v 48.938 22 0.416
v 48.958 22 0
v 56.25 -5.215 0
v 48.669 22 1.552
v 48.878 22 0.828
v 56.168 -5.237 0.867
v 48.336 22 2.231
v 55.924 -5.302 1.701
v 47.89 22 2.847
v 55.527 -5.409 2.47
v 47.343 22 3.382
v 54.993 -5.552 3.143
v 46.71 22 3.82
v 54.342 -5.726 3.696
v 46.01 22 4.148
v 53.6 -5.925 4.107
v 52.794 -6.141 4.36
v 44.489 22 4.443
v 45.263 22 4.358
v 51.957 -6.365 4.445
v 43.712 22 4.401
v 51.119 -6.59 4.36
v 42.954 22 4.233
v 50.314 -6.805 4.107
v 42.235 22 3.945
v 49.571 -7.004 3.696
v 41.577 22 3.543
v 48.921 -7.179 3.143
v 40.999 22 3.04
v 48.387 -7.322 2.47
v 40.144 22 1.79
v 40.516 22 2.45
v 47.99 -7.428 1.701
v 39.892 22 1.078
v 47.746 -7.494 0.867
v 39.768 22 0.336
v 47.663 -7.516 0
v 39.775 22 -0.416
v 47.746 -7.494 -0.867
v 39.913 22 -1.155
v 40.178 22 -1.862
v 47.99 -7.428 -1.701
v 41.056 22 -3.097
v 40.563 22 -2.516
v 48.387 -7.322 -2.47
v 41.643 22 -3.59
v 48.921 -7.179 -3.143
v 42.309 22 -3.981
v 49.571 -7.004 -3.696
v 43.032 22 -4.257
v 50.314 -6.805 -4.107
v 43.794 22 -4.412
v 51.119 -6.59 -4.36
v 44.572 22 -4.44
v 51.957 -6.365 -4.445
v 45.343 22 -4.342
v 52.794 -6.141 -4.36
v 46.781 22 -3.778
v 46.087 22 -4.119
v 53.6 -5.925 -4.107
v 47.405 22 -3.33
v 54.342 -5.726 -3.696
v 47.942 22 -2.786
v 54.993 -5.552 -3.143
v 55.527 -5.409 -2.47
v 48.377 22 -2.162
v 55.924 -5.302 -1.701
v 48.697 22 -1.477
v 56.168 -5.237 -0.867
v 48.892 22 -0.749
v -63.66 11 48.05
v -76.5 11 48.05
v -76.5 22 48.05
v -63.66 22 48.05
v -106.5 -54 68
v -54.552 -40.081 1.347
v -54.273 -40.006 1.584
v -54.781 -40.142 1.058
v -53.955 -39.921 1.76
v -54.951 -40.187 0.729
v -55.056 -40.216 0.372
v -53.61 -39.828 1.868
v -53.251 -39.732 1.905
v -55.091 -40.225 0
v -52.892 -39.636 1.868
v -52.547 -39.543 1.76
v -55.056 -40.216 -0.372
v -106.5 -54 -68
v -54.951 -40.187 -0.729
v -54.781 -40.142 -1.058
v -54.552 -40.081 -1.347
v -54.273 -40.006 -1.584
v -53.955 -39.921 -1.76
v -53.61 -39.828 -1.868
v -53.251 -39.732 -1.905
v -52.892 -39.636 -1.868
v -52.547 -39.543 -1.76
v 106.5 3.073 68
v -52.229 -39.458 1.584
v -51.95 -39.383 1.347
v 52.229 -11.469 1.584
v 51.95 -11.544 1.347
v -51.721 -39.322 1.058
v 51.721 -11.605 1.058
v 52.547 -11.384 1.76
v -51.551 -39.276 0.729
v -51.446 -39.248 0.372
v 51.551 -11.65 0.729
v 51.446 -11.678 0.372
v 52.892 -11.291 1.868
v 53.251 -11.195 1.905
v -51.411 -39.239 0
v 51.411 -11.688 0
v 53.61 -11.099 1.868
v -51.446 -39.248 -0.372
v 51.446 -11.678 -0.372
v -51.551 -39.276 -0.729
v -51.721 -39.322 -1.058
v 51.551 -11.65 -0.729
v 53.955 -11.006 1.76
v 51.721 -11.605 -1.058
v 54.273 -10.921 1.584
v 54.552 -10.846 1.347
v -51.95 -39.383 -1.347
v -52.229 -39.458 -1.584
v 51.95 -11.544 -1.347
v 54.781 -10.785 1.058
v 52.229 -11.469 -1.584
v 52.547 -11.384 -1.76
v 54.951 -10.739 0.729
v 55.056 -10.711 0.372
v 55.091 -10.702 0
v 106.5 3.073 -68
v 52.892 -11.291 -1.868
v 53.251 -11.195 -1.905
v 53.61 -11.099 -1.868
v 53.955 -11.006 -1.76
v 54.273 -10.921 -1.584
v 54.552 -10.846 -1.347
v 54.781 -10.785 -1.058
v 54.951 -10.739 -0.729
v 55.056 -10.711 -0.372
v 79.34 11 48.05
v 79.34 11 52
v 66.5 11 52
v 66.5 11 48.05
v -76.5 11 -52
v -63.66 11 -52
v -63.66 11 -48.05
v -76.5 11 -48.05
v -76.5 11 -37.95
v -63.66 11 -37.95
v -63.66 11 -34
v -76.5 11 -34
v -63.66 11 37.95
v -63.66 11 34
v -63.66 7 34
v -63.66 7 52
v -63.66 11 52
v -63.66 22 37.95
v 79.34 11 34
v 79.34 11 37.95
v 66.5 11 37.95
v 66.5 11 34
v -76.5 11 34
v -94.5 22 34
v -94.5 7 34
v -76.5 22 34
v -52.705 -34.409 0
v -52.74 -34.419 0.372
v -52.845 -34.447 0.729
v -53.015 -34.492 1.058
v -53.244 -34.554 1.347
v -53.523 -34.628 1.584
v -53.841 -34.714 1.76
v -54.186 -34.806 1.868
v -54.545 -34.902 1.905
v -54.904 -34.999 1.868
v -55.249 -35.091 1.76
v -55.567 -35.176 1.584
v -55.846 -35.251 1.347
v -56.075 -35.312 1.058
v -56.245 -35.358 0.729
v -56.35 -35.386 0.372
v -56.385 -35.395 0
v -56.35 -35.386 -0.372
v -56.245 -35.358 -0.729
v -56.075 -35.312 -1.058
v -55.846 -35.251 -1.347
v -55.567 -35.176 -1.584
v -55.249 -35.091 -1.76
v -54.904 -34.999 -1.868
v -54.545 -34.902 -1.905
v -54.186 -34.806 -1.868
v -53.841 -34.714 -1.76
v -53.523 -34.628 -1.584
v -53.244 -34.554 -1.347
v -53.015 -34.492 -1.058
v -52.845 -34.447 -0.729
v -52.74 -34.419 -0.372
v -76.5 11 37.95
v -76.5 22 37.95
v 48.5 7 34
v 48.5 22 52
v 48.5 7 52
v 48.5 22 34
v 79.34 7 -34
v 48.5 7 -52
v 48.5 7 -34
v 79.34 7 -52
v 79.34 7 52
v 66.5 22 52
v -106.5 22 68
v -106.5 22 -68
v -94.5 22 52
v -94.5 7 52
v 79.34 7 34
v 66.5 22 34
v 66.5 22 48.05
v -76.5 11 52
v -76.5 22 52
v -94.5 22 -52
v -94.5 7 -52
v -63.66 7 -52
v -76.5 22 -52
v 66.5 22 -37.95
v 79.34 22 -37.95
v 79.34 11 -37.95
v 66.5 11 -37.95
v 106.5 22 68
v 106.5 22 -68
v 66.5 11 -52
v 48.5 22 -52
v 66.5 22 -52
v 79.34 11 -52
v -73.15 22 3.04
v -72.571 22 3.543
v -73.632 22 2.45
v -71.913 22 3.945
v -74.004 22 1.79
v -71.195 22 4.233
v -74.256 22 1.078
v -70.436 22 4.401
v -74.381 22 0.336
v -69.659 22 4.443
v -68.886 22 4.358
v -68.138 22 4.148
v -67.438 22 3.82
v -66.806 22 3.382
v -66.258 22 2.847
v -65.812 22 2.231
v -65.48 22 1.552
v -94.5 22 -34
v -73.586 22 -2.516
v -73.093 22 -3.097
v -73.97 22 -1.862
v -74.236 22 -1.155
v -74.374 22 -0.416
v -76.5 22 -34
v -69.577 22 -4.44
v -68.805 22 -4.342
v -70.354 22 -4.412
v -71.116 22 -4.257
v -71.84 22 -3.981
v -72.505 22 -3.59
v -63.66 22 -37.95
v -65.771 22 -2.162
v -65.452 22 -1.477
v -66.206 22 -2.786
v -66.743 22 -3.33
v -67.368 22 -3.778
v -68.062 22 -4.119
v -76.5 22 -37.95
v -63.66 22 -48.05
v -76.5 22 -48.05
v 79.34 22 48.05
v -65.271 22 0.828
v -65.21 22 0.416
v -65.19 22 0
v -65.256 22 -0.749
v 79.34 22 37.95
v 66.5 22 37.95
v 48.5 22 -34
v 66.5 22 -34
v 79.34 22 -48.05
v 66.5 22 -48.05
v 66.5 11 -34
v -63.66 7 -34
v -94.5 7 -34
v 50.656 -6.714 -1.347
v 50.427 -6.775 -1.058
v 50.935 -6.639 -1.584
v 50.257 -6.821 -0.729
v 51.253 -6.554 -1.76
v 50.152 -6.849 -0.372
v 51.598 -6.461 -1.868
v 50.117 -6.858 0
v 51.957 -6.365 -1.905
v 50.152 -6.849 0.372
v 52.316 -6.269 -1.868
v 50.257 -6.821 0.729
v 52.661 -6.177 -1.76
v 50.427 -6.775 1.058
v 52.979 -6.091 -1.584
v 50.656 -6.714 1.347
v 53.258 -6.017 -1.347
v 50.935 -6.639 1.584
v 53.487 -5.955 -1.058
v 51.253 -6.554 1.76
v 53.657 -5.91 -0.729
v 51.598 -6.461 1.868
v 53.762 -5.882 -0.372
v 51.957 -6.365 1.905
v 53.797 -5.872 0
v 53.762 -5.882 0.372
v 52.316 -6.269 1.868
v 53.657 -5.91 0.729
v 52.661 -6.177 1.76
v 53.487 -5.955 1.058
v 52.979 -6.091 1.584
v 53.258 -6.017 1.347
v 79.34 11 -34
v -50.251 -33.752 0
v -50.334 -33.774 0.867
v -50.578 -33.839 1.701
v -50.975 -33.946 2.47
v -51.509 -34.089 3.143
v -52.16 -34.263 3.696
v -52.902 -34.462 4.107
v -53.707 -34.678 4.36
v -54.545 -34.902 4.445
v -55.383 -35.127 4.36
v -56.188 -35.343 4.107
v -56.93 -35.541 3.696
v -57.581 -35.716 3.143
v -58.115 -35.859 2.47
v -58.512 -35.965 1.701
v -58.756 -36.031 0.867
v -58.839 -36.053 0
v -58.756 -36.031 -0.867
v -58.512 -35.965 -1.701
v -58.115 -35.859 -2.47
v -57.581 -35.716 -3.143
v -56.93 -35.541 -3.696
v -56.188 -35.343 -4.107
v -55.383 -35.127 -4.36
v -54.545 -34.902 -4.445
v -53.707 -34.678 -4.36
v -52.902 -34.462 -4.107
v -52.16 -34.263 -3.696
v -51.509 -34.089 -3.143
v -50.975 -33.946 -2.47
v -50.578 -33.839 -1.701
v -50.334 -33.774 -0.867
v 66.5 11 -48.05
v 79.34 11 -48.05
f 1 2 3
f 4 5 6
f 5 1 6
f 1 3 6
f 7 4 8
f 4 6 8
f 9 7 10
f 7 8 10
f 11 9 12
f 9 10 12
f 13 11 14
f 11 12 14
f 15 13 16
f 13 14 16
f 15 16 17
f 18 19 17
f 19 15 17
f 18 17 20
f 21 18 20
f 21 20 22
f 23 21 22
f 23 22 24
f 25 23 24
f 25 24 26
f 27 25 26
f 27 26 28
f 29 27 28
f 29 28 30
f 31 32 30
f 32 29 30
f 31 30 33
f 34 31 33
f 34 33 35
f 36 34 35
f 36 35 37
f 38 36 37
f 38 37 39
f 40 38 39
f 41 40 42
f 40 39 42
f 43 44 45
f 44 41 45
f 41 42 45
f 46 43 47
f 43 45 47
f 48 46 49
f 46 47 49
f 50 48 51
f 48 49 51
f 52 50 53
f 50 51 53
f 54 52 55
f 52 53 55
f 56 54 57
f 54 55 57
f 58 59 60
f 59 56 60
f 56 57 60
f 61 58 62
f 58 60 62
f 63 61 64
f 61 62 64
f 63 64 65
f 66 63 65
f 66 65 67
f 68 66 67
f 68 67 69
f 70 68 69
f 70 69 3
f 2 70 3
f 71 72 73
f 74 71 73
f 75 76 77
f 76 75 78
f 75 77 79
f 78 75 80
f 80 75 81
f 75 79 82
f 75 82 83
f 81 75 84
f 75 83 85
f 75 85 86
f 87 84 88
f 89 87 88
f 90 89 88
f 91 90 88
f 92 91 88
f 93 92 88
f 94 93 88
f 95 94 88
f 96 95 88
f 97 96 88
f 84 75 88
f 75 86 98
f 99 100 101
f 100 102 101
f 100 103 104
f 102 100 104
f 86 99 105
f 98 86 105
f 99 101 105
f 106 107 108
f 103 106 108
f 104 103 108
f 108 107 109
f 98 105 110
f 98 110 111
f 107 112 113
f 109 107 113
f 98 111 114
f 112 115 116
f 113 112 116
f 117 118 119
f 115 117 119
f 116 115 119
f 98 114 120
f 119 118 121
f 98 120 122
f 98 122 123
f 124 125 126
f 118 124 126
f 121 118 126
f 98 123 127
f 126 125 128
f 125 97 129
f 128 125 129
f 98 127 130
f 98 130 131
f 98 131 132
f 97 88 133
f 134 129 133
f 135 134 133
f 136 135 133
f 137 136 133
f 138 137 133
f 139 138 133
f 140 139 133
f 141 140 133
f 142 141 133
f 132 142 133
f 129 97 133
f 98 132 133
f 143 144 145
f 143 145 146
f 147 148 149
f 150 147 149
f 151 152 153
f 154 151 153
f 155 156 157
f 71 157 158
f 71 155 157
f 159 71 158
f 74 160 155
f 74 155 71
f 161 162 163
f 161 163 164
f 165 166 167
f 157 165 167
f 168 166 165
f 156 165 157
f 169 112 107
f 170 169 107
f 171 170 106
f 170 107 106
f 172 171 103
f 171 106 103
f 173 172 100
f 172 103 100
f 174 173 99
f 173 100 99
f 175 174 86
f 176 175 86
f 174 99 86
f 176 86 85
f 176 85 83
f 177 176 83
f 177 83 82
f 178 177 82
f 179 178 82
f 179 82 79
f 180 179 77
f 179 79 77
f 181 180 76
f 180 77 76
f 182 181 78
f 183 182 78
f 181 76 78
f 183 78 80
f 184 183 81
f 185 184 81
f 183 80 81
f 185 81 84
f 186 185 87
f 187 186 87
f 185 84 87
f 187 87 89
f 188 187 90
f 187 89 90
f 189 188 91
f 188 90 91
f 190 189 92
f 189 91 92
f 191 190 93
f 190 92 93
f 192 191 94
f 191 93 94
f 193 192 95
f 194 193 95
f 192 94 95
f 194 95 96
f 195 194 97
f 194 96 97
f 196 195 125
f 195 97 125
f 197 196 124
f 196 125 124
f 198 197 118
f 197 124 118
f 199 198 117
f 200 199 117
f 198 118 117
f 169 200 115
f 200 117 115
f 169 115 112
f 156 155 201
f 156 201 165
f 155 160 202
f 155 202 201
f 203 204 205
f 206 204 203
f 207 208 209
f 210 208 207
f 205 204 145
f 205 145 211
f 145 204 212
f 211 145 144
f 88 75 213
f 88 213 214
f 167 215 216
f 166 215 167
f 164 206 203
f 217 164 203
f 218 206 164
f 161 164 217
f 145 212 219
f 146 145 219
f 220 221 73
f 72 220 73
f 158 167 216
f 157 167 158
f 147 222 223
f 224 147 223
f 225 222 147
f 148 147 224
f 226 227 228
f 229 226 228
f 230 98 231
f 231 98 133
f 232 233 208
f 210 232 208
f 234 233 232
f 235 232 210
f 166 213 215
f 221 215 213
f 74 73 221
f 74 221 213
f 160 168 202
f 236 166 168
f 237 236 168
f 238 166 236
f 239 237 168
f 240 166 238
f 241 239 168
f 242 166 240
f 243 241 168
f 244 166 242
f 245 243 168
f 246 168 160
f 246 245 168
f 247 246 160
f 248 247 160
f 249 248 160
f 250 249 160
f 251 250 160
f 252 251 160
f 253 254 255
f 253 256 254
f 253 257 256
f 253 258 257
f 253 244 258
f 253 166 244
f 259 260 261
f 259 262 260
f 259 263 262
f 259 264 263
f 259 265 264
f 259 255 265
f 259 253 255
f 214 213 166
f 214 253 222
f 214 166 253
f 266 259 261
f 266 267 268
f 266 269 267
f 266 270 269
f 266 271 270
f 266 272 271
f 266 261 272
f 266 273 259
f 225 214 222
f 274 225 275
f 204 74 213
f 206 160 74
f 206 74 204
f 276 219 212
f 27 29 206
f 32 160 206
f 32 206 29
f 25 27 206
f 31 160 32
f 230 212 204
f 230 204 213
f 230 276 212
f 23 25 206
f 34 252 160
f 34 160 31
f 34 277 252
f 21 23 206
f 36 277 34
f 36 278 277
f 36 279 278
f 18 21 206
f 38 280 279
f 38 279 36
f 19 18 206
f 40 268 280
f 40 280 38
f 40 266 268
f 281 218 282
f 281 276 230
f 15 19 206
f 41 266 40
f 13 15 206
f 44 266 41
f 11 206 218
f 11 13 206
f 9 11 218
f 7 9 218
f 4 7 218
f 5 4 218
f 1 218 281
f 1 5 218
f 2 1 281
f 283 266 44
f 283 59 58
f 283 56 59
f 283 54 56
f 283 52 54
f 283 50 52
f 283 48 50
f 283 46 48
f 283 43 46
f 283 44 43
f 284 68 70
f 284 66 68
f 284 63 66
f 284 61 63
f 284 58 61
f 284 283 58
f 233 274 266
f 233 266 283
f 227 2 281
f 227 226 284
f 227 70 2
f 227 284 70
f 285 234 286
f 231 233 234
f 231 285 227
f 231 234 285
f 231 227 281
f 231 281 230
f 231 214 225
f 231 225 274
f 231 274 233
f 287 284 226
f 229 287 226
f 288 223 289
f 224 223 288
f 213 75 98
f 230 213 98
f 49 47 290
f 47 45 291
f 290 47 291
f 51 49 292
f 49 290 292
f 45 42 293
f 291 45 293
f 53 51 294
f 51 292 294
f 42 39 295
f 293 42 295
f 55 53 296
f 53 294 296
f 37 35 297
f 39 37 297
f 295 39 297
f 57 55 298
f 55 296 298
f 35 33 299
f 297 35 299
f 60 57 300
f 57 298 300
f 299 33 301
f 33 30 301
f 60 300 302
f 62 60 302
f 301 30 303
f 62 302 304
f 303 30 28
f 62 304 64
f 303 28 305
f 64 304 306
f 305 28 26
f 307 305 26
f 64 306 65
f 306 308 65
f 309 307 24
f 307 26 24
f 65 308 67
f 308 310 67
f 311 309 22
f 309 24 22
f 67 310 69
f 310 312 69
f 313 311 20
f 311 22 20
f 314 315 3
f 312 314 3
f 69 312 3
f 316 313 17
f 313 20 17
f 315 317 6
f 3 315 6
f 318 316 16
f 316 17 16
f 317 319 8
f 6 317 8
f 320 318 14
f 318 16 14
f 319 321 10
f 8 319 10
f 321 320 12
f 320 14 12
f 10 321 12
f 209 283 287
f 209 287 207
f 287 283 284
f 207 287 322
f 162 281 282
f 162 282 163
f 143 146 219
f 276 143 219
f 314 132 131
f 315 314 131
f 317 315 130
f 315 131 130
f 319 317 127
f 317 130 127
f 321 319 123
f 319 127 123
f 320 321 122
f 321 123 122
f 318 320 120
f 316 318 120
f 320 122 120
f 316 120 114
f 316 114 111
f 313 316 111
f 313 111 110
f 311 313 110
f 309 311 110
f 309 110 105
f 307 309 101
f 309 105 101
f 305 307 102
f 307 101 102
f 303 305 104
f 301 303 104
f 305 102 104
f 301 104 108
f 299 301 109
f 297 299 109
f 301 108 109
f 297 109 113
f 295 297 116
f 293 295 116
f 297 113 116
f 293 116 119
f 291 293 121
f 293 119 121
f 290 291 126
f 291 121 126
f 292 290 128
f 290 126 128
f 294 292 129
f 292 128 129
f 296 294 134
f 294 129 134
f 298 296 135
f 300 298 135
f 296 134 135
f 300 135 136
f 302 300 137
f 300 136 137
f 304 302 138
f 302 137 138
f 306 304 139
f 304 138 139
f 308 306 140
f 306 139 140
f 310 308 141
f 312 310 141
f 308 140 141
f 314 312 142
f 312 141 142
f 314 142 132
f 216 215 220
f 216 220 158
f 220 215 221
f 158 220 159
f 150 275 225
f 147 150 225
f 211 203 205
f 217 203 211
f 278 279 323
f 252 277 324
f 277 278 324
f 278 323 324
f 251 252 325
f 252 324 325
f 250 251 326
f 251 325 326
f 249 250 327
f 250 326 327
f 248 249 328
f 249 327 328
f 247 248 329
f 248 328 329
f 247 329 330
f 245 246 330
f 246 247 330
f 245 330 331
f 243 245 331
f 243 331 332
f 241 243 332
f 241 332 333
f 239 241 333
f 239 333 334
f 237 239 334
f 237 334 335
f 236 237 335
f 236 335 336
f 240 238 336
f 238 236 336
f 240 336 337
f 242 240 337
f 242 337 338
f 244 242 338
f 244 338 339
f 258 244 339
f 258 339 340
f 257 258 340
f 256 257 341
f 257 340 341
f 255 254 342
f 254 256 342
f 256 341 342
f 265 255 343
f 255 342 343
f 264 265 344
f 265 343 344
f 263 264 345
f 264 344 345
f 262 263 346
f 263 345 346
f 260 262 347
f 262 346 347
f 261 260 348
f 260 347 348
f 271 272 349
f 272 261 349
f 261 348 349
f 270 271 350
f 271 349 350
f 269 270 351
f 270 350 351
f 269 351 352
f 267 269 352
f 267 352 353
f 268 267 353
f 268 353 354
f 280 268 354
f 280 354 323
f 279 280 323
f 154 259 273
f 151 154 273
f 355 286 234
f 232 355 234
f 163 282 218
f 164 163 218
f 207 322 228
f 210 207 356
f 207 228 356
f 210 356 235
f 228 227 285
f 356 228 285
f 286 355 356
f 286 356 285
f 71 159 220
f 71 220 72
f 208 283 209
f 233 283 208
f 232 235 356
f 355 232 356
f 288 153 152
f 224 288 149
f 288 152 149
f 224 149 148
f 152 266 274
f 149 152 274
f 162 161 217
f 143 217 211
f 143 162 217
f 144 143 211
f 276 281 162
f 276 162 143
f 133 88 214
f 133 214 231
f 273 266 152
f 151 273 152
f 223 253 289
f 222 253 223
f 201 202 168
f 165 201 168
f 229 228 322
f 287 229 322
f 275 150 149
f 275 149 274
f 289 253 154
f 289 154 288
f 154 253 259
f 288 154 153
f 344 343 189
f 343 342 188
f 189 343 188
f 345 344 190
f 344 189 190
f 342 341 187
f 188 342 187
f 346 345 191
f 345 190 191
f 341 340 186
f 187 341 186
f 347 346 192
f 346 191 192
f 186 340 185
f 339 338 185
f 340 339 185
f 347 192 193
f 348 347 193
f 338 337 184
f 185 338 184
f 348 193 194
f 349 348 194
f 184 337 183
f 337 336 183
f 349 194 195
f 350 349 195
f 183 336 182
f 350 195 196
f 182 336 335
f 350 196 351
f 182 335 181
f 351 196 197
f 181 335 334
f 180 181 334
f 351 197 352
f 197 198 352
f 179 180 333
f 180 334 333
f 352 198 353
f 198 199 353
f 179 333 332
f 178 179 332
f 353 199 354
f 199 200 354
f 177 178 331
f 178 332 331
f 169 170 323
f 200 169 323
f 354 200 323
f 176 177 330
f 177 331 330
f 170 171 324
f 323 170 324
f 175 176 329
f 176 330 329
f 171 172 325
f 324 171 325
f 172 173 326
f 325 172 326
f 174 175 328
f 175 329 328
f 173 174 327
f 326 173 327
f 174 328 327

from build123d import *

# Parameters (mm, degrees)
BOSS_EXTRUDE1_DEPTH      = 22
BOSS_EXTRUDE1_DEPTH_BACK = 54
SKETCH1_W                = 213
SKETCH1_H                = 136
SKETCH2_W                = 18
SKETCH2_H                = 18
CUT_EXTRUDE1_DEPTH       = 15
CUT_EXTRUDE2_DEPTH       = 12.84
CUT_EXTRUDE3_DEPTH       = 12.84
CUT_EXTRUDE4_DEPTH       = 181.981352631
SKETCH9_R                = 1.905
CUT_EXTRUDE8_DEPTH       = 5
SKETCH11_R               = 4.445
CUT_EXTRUDE10_DEPTH      = 137.921009741


with BuildPart() as part:
    # Sketch1 → Boss-Extrude1 (new, two sides: drawn at the far end of the back side and taken through both)
    with BuildSketch(Plane(origin=(0, 0, 0), x_dir=(1, 0, 0), z_dir=(0, 1, 0)).offset(-BOSS_EXTRUDE1_DEPTH_BACK)):
        Rectangle(SKETCH1_W, SKETCH1_H)
    extrude(amount=BOSS_EXTRUDE1_DEPTH + BOSS_EXTRUDE1_DEPTH_BACK)

    # Sketch2 → Cut-Extrude1 (cut)
    with BuildSketch(Plane(origin=(0, 22, 0), x_dir=(1, 0, 0), z_dir=(0, 1, 0))):
        with Locations((-85.5, 43)):
            Rectangle(SKETCH2_W, SKETCH2_H)
        with Locations((-85.5, -43)):
            Rectangle(SKETCH2_W, SKETCH2_H)
        with Locations((57.5, 43)):
            Rectangle(SKETCH2_W, SKETCH2_H)
        with Locations((57.5, -43)):
            Rectangle(SKETCH2_W, SKETCH2_H)
    extrude(amount=-CUT_EXTRUDE1_DEPTH, mode=Mode.SUBTRACT)

    # Sketch4 → Cut-Extrude2 (cut)
    with BuildSketch(Plane.ZY.offset(76.5)):
        Polygon((34, 7), (52, 7), (52, 11), (48.05, 11), (48.05, 24.194829177), (37.95, 24.194829177), (37.95, 11), (34, 11), align=None)
        Polygon((-34, 7), (-52, 7), (-52, 11), (-48.05, 11), (-48.05, 24.194829177), (-37.95, 24.194829177), (-37.95, 11), (-34, 11), align=None)
    extrude(amount=-CUT_EXTRUDE2_DEPTH, mode=Mode.SUBTRACT)

    # Sketch5 → Cut-Extrude3 (cut)
    with BuildSketch(Plane.ZY.offset(-66.5)):
        Polygon((34, 7), (52, 7), (52, 11), (48.05, 11), (48.05, 24.194829177), (37.95, 24.194829177), (37.95, 11), (34, 11), align=None)
        Polygon((-34, 7), (-52, 7), (-52, 11), (-48.05, 11), (-48.05, 24.194829177), (-37.95, 24.194829177), (-37.95, 11), (-34, 11), align=None)
    extrude(amount=-CUT_EXTRUDE3_DEPTH, mode=Mode.SUBTRACT)

    # Sketch7 → Cut-Extrude4 (cut, through all)
    with BuildSketch(Plane(origin=(0, 0, -68), x_dir=(-1, 0, 0), z_dir=(0, 0, -1))):
        Polygon((106.5, -54), (-106.5, 3.073177988), (-106.5, -54), align=None)
    extrude(amount=-CUT_EXTRUDE4_DEPTH, mode=Mode.SUBTRACT)

    # Sketch9 → Cut-Extrude8 (cut)
    with BuildSketch(Plane(origin=(6.365852752, -23.757685902, 0), x_dir=(0.9659258262890681, 0.2588190451025214, 0), z_dir=(0.2588190451025214, -0.9659258262890681, 0))):
        with Locations((-61.719828935, 0)):
            Circle(SKETCH9_R)
        with Locations((48.538997492, 0)):
            Circle(SKETCH9_R)
    extrude(amount=-CUT_EXTRUDE8_DEPTH, mode=Mode.SUBTRACT)

    # Sketch11 → Cut-Extrude10 (cut, through all)
    with BuildSketch(Plane(origin=(5.071757526, -18.928056771, 0), x_dir=(0.9659258262890681, 0.25881904510252135, 0), z_dir=(0.25881904510252135, -0.9659258262890681, 0))):
        with Locations((-61.719828935, 0)):
            Circle(SKETCH11_R)
        with Locations((48.538997492, 0)):
            Circle(SKETCH11_R)
    extrude(amount=-CUT_EXTRUDE10_DEPTH, mode=Mode.SUBTRACT)


solid = part.part
